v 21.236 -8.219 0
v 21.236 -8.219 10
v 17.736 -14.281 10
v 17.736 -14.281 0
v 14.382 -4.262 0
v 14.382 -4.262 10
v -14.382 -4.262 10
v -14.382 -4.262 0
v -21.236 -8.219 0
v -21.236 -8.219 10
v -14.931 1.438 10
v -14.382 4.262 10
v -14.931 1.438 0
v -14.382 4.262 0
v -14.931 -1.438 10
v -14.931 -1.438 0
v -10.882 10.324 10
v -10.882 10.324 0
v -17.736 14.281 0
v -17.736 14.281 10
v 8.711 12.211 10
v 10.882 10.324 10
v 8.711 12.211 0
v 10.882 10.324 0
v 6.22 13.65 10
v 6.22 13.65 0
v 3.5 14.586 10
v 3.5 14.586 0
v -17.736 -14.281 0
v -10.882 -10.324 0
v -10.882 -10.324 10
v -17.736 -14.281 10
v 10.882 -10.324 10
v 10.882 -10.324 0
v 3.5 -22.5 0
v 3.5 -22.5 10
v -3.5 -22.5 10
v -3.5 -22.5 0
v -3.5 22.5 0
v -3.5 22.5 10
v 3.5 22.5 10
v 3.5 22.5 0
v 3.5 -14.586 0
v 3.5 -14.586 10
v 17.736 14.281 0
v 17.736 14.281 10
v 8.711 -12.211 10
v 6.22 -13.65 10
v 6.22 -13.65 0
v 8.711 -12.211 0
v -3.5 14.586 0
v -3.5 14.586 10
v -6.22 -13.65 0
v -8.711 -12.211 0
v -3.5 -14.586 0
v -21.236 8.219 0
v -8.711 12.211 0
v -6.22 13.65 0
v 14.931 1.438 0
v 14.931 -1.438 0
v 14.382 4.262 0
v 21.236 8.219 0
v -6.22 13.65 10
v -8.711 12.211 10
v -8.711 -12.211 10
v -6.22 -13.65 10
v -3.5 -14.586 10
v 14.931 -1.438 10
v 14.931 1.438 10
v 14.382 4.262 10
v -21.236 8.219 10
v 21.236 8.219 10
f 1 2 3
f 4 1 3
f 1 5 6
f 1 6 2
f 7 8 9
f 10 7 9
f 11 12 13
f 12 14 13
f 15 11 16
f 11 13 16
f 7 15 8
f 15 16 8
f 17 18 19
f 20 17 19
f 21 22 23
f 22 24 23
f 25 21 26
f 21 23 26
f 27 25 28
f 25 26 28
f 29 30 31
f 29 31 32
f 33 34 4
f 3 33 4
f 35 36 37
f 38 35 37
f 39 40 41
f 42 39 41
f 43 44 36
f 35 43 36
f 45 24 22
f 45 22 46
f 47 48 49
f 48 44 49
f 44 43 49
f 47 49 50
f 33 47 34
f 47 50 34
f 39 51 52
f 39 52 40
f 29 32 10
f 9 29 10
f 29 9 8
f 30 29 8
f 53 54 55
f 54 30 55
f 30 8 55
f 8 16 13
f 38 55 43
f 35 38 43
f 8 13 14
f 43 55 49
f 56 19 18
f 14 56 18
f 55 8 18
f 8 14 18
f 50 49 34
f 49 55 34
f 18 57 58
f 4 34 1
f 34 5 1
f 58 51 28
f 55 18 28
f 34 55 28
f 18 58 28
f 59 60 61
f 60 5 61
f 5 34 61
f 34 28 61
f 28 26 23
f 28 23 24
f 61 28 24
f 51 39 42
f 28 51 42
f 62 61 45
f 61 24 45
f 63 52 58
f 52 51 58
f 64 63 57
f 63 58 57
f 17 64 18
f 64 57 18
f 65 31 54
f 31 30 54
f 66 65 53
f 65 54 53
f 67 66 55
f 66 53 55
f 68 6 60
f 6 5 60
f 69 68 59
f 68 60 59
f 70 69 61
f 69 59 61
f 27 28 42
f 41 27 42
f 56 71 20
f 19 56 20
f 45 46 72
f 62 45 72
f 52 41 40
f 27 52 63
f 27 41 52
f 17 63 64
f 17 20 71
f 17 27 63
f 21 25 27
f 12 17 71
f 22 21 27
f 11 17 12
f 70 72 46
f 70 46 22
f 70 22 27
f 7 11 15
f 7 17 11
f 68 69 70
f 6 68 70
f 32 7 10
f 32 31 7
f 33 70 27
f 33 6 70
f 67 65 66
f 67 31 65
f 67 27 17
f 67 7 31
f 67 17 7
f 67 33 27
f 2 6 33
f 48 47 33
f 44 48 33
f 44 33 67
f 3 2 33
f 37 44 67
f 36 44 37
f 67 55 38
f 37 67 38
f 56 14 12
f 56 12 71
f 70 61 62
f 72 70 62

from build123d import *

# Parameters (mm, degrees)
SKETCH1_R           = 15
BOSS_EXTRUDE1_DEPTH = 10
SKETCH2_W           = 7
SKETCH2_H           = 15
BOSS_EXTRUDE2_DEPTH = 10
CIRPATTERN1_COUNT   = 6


with BuildPart() as part:
    # Sketch1 → Boss-Extrude1 (new body)
    with BuildSketch(Plane.XY):
        Circle(SKETCH1_R)
    extrude(amount=BOSS_EXTRUDE1_DEPTH)

    # Sketch2 → Boss-Extrude2 (add)
    with BuildSketch(Plane.XY.offset(10)):
        with Locations((0, 15)):
            Rectangle(SKETCH2_W, SKETCH2_H)
    boss_extrude2 = extrude(amount=-BOSS_EXTRUDE2_DEPTH)

    # CirPattern1: Boss-Extrude2 ×6 about axis
    cirpattern1_axis = Axis((0, 0, 0), (0, 0, 1))
    for i in range(1, CIRPATTERN1_COUNT):
        add(boss_extrude2.rotate(cirpattern1_axis, i * 360 / CIRPATTERN1_COUNT))


solid = part.part
